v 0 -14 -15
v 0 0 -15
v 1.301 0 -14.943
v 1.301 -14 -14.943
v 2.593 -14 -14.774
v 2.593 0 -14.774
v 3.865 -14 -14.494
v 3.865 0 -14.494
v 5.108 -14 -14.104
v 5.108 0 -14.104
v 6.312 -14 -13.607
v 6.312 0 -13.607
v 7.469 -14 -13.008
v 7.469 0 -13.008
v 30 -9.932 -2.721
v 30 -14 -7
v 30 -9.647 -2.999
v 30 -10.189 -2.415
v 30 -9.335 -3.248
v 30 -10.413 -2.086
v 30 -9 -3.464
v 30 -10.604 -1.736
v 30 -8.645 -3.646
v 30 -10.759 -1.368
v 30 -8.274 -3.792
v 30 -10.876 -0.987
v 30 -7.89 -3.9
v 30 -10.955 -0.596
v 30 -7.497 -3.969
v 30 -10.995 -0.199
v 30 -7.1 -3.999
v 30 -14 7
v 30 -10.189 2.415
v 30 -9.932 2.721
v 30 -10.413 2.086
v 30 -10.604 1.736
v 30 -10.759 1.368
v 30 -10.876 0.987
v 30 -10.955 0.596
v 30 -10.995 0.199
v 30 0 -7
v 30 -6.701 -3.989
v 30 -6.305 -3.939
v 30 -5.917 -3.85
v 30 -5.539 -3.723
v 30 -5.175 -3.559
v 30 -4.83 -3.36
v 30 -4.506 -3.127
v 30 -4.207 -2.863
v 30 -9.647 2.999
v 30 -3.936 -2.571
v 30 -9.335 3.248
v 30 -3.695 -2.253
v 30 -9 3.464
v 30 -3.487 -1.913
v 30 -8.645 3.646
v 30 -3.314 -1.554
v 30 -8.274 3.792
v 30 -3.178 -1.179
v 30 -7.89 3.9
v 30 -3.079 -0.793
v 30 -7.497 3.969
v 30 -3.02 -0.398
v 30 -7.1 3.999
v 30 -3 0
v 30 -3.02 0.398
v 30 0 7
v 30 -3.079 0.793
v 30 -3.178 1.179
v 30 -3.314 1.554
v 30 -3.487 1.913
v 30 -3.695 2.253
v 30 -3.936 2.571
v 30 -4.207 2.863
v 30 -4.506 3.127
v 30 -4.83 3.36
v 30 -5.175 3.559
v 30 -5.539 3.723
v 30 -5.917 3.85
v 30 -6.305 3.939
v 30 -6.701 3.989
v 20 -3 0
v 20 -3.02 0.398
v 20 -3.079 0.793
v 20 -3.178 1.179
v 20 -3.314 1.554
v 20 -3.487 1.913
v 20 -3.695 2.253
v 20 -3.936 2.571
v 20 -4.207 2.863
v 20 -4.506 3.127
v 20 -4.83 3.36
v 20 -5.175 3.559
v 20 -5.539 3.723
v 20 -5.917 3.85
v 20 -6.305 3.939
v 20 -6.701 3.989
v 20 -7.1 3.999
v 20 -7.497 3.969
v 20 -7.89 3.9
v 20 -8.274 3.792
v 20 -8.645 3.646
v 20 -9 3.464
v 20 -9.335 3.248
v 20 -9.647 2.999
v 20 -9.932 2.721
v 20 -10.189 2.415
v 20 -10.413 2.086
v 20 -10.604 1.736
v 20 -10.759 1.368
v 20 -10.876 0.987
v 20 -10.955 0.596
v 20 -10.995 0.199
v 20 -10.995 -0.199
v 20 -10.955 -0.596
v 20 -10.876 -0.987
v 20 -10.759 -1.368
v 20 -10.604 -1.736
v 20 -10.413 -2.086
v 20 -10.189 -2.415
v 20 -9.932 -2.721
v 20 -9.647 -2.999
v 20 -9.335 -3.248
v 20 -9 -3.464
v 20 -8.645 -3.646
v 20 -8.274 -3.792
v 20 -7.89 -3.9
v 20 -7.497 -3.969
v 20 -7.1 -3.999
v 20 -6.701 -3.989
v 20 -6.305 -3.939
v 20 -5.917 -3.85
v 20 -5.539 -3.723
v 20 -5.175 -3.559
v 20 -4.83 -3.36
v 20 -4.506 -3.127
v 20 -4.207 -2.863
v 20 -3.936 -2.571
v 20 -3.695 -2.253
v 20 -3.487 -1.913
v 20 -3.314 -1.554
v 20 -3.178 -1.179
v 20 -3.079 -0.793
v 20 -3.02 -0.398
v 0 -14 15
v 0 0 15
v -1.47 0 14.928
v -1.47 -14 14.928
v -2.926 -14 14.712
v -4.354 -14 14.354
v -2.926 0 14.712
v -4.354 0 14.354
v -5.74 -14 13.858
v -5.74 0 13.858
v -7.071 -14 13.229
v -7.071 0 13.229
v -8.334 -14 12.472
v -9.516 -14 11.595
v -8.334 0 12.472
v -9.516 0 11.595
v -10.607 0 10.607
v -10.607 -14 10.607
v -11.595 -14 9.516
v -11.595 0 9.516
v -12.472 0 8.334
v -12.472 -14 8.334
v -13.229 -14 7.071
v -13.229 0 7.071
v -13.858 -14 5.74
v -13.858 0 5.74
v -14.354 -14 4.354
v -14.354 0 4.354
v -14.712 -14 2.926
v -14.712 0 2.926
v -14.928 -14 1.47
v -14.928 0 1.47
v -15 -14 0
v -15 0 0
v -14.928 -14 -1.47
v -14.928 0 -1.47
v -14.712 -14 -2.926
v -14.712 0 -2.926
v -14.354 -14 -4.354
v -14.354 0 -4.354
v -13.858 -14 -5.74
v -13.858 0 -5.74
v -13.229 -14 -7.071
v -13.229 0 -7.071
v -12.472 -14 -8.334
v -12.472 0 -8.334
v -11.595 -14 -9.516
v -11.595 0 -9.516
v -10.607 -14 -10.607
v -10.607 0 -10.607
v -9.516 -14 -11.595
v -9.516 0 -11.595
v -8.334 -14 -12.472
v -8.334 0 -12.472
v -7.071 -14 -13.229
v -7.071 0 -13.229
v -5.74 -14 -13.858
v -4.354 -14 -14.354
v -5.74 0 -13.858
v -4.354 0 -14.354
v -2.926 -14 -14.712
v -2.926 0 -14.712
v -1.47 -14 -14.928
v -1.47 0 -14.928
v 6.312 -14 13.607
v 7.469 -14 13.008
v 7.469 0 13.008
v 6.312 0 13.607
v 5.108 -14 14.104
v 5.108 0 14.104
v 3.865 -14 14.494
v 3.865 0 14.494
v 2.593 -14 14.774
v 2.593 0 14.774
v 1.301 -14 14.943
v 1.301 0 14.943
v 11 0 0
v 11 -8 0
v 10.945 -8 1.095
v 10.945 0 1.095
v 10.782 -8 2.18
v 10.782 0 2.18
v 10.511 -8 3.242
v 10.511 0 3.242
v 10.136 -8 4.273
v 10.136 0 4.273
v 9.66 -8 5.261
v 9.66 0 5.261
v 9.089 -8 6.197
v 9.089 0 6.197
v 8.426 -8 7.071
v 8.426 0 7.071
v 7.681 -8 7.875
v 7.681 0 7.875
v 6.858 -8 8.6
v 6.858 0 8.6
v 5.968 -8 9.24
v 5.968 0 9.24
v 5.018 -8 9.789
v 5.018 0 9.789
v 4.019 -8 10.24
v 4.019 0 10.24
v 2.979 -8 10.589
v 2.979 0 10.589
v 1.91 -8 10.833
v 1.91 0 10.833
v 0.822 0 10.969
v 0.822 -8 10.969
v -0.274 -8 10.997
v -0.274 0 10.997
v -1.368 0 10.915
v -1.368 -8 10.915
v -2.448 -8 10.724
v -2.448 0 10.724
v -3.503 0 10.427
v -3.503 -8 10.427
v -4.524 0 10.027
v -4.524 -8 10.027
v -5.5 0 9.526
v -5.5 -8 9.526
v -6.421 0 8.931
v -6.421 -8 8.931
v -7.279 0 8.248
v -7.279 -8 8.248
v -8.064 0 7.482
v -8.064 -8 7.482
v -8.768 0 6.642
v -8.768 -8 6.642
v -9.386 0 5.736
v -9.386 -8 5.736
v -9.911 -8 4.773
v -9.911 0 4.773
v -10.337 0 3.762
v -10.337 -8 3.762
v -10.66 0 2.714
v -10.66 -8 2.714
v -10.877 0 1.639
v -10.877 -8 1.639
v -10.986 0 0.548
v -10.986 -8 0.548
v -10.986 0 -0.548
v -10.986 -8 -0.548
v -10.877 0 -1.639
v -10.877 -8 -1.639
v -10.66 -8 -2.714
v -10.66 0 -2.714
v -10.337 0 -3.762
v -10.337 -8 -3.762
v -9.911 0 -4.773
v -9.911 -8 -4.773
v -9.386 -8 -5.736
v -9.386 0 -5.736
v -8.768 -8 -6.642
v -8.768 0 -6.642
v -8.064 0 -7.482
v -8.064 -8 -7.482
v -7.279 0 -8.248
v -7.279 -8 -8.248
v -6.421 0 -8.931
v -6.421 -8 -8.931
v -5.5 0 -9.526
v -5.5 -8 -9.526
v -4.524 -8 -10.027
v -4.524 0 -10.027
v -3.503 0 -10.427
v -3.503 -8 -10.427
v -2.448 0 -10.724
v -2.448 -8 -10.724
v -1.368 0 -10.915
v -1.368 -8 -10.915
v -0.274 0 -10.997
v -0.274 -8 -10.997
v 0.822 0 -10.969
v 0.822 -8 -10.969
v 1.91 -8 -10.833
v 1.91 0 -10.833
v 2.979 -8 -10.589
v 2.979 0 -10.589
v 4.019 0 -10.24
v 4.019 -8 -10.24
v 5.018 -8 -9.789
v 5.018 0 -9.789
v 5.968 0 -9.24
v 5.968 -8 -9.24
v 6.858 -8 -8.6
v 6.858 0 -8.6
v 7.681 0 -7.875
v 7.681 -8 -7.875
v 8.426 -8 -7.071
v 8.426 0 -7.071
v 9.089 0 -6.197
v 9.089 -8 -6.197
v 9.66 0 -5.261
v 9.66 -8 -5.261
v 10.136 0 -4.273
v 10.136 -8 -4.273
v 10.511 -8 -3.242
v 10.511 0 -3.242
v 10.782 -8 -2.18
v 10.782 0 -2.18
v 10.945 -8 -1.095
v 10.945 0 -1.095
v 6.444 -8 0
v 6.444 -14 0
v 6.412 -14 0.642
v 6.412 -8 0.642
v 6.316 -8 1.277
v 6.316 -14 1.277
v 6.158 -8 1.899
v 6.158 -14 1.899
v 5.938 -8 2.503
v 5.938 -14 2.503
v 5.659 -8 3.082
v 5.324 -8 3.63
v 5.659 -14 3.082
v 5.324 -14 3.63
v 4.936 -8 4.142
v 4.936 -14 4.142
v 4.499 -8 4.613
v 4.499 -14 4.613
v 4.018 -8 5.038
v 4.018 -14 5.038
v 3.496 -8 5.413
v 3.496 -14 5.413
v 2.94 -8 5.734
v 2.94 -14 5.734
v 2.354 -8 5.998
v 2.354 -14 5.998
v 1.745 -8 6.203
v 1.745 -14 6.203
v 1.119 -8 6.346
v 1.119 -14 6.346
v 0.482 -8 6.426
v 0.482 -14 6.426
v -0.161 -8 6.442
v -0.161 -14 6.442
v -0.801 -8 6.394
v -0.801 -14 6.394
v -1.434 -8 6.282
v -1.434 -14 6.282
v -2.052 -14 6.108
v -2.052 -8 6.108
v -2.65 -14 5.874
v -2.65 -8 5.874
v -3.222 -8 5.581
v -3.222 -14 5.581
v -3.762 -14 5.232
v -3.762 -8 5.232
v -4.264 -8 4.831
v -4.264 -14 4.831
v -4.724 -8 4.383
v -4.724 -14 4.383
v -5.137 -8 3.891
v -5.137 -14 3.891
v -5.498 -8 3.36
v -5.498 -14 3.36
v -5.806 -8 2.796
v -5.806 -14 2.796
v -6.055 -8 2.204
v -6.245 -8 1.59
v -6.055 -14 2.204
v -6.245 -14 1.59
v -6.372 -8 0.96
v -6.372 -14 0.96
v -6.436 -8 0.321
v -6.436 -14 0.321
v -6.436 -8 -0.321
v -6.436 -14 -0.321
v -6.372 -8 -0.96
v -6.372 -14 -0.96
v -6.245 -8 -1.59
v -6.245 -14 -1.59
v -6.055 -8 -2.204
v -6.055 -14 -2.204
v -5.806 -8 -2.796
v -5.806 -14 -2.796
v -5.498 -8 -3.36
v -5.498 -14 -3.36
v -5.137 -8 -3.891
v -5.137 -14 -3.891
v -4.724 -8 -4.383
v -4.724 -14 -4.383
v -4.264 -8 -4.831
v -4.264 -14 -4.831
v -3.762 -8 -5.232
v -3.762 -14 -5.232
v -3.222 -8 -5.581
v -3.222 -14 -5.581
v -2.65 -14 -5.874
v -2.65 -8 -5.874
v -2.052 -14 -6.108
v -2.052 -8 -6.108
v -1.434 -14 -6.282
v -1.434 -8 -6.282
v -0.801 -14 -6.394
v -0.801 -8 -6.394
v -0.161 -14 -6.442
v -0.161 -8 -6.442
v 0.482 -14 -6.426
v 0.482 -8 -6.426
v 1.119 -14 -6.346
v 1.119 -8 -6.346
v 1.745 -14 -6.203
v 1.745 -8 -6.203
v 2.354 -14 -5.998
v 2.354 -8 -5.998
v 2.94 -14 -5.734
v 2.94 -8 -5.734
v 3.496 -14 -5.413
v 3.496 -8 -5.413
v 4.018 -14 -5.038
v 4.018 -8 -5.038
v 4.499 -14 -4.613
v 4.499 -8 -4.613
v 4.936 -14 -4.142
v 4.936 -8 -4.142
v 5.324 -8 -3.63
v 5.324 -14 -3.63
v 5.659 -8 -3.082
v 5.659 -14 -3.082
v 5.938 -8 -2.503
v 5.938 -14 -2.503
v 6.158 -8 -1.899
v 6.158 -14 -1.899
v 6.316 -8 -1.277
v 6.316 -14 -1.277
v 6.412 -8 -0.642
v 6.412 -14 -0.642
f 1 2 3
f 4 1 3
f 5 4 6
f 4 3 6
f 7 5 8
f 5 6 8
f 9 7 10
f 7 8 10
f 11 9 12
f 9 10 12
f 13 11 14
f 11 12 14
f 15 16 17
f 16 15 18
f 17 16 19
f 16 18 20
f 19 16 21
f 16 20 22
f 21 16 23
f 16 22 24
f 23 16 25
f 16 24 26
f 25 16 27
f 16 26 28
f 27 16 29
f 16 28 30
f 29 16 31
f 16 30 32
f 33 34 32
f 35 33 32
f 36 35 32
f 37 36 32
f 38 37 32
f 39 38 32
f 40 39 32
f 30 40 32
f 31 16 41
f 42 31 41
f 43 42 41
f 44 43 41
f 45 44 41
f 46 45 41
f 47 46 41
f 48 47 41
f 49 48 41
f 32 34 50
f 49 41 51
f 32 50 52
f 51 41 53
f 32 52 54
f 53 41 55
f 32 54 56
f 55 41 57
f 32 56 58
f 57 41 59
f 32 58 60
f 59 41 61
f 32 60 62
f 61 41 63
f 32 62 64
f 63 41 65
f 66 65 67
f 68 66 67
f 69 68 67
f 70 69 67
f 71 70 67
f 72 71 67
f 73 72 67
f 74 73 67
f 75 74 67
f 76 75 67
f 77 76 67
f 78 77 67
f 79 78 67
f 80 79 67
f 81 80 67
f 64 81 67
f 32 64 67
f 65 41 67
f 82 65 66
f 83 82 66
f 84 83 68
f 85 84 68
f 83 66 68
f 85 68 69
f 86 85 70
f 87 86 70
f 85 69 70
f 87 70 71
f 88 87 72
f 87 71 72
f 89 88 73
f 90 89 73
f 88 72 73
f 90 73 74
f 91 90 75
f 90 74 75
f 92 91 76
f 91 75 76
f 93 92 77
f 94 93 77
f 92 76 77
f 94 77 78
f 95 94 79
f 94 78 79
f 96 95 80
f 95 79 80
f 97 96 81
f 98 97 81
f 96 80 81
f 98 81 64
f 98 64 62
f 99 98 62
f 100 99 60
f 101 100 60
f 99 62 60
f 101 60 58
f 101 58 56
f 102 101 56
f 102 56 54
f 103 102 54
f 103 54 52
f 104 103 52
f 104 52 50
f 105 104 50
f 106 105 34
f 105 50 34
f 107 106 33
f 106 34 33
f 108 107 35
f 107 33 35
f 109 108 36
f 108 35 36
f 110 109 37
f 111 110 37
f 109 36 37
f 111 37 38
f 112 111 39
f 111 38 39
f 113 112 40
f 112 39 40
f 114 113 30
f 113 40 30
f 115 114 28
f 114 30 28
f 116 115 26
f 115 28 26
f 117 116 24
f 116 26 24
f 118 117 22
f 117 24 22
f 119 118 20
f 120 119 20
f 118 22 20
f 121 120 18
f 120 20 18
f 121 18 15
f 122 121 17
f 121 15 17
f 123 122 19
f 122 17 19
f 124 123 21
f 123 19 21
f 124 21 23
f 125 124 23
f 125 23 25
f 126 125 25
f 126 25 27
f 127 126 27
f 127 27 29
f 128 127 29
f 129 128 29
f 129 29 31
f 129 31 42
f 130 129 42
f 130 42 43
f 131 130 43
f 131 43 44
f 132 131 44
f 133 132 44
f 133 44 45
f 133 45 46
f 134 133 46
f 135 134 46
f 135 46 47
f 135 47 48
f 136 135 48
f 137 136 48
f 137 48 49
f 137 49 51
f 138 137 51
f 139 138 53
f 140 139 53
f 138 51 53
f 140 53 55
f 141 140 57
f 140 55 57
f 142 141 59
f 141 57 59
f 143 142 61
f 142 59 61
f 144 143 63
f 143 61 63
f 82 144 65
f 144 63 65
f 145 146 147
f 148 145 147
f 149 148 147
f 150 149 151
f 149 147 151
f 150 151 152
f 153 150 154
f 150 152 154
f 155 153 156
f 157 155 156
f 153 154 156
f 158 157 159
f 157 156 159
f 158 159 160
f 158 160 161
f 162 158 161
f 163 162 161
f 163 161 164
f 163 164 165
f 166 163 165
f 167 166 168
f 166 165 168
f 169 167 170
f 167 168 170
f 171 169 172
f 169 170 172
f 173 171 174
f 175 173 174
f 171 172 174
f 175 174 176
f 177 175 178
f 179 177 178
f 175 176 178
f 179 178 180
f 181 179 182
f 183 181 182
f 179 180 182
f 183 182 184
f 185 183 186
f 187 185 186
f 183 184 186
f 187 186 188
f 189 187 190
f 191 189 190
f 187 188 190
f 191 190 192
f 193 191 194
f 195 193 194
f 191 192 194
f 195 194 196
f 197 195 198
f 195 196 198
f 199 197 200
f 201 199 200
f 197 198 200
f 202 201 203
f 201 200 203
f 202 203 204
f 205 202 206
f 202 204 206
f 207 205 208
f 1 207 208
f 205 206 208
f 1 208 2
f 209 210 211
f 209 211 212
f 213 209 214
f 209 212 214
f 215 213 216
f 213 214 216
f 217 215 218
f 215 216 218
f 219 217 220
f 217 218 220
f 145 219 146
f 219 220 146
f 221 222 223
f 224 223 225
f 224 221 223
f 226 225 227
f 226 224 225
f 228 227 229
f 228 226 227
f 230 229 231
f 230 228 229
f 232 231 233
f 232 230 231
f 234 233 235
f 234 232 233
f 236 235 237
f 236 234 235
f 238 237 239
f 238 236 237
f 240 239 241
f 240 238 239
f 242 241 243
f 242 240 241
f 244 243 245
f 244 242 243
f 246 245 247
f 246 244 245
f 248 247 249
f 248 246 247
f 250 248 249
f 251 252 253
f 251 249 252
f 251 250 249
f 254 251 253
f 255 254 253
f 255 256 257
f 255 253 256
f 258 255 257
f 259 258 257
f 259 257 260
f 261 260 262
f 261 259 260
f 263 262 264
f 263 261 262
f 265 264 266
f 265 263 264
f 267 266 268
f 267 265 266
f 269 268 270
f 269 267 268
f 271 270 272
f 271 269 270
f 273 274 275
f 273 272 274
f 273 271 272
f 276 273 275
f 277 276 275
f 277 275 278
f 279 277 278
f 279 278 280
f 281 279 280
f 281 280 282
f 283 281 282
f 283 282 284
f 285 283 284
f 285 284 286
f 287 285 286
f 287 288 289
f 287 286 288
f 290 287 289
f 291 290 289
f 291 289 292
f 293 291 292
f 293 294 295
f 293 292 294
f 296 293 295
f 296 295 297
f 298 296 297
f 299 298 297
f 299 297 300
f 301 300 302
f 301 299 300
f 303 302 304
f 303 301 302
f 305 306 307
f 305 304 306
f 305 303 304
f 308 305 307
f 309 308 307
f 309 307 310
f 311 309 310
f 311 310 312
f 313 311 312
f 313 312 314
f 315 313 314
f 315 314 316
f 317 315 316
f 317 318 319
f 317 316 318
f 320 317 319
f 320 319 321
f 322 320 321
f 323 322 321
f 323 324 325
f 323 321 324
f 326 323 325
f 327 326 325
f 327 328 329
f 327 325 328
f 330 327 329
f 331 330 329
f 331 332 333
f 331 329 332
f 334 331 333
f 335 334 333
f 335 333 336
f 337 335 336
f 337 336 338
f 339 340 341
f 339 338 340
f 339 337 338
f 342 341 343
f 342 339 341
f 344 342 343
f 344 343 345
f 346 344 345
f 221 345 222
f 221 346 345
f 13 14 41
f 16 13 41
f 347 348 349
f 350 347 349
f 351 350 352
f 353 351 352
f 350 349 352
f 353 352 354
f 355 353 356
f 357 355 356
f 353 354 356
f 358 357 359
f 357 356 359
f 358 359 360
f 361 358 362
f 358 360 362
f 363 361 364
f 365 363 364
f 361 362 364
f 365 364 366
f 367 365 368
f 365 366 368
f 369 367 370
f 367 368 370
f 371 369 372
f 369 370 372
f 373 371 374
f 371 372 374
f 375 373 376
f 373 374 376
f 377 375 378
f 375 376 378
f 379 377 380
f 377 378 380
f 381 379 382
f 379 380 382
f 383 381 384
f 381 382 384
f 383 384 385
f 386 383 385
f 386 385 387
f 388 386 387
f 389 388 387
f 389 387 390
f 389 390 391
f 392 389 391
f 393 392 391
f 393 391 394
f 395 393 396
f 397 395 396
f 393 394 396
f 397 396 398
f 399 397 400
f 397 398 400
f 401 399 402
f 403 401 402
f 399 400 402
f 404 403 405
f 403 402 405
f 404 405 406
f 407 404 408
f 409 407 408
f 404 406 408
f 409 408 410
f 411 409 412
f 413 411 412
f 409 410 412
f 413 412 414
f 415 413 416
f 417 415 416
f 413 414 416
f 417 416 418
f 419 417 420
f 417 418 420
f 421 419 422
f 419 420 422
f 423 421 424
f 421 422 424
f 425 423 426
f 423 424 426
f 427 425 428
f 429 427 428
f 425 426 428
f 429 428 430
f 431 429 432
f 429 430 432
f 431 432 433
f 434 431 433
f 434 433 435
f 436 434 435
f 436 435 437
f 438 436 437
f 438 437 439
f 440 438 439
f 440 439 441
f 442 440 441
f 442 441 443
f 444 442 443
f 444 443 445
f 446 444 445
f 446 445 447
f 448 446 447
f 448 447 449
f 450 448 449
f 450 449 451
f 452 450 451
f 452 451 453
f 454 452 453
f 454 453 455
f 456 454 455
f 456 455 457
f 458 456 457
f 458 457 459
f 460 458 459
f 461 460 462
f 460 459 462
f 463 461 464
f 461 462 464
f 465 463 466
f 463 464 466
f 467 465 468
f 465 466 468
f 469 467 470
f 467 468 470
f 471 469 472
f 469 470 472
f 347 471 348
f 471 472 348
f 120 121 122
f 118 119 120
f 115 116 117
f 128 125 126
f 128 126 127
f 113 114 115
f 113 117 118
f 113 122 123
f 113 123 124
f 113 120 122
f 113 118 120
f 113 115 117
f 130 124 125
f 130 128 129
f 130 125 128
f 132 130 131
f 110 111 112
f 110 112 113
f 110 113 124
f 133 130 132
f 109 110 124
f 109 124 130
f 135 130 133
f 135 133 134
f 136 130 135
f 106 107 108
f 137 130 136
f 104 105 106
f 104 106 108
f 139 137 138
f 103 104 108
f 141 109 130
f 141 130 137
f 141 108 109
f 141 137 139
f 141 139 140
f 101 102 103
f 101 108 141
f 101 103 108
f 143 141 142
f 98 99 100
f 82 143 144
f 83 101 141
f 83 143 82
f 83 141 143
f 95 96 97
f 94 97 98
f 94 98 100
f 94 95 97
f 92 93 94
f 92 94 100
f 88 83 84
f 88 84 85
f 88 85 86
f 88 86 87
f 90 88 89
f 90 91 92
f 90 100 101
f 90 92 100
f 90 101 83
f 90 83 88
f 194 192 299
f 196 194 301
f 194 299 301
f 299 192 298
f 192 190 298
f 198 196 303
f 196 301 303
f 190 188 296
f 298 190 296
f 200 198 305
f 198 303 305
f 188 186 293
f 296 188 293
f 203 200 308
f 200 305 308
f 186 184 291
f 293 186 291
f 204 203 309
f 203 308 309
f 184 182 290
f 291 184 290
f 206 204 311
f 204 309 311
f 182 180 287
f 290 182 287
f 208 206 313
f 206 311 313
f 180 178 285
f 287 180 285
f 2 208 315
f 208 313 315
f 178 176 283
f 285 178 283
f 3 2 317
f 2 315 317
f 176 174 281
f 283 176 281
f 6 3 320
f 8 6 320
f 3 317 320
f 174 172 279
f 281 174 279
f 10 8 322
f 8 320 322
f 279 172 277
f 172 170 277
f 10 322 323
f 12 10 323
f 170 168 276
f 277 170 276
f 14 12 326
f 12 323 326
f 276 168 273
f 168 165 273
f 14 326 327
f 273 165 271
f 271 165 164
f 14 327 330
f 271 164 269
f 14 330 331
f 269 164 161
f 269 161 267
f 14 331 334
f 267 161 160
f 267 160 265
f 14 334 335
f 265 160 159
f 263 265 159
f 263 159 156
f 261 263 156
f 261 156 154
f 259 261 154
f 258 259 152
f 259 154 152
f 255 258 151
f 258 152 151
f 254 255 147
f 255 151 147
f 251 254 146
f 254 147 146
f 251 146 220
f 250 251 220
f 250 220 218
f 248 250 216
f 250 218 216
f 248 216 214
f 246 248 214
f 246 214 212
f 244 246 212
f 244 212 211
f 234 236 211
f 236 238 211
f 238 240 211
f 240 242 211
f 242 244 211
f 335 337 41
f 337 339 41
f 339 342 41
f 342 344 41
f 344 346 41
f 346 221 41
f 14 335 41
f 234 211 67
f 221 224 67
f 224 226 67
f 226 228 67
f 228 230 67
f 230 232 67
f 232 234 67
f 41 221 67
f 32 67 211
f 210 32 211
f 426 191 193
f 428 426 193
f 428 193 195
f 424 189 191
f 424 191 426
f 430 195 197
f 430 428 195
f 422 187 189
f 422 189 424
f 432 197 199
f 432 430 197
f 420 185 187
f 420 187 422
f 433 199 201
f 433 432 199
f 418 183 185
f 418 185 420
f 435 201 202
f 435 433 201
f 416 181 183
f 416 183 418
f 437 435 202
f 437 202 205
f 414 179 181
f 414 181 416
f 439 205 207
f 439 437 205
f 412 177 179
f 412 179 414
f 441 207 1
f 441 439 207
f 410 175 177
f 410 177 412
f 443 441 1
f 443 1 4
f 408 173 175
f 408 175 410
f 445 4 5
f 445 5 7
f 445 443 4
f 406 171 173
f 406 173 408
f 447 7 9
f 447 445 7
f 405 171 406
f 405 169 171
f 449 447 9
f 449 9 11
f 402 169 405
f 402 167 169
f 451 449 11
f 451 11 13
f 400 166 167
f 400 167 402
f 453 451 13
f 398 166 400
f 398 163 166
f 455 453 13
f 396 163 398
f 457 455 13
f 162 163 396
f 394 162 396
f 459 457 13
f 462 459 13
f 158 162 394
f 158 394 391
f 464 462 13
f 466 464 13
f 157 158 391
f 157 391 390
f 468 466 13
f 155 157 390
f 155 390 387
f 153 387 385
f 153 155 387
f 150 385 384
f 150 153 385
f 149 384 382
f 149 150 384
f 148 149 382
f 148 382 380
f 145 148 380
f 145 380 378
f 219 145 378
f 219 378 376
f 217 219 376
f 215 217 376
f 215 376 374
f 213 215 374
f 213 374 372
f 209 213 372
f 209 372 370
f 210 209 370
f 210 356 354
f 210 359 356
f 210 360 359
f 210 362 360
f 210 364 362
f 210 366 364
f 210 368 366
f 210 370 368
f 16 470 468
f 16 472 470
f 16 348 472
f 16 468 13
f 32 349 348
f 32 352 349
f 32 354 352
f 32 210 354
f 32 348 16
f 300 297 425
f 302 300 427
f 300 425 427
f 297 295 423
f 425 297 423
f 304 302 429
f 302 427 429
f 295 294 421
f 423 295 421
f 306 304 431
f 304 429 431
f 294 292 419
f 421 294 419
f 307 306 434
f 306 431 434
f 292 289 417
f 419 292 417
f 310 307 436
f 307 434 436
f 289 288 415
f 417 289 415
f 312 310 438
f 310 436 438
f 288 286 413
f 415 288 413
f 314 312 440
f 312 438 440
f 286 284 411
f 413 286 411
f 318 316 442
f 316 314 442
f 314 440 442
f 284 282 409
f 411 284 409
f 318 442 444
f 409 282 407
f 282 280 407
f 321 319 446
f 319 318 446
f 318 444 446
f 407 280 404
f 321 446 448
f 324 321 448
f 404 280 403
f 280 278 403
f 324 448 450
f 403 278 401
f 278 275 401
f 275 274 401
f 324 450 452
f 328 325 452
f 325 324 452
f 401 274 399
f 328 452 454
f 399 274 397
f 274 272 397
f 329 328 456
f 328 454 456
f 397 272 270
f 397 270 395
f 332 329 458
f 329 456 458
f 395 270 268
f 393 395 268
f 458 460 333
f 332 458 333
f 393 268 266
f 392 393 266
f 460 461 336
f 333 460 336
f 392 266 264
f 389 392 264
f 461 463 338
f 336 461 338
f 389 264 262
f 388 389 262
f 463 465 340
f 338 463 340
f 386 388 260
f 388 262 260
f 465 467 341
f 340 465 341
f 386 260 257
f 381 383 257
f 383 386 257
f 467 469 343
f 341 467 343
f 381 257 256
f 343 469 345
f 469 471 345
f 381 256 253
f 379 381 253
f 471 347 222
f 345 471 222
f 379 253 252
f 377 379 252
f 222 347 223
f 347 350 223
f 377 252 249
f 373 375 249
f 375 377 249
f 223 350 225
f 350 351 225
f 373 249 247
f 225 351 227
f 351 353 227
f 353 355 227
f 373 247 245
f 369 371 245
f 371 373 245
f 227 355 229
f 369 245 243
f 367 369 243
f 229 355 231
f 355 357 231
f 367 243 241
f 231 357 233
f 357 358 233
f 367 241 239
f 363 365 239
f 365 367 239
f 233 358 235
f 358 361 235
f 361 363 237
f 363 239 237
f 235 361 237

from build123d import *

# Parameters (mm, degrees)
F0_R     = 11
F1_DEPTH = 14
F2_R     = 4
F3_DEPTH = 10
F4_R     = 11.274744
F4_R_2   = 6.443865
F5_DEPTH = 6


with BuildPart() as f1:
    # F0 (on Front) → F1 (new body)
    with BuildSketch(Plane.XZ):
        with BuildLine():
            Line((7.46888, 13.008299), (0, 15))
            ThreePointArc((0, 15), (-15, 0), (0, -15))
            Line((0, -15), (7.46888, -13.008299))
            ThreePointArc((7.46888, -13.008299), (12.981394, -7.515544), (15, 0))
            ThreePointArc((15, 0), (12.981394, 7.515544), (7.46888, 13.008299))
        make_face()
        Circle(F0_R, mode=Mode.SUBTRACT)
        with BuildLine():
            ThreePointArc((7.46888, 13.008299), (3.86494, 14.493524), (0, 15))
            Line((0, 15), (7.46888, 13.008299))
        make_face()
        with BuildLine():
            Line((7.46888, -13.008299), (0, -15))
            ThreePointArc((0, -15), (3.86494, -14.493524), (7.46888, -13.008299))
        make_face()
        with BuildLine():
            Line((30, 7), (7.46888, 13.008299))
            ThreePointArc((7.46888, 13.008299), (12.981394, 7.515544), (15, 0))
            ThreePointArc((15, 0), (12.981394, -7.515544), (7.46888, -13.008299))
            Line((7.46888, -13.008299), (30, -7))
            Line((30, -7), (30, 0))
            Line((30, 0), (30, 7))
        make_face()
    extrude(amount=F1_DEPTH)

    # F2 (on face) → F3 (cut)
    with BuildSketch(Plane.YZ.offset(30)):
        with Locations((-7, 0)):
            Circle(F2_R)
    extrude(amount=-F3_DEPTH, mode=Mode.SUBTRACT)

    # F4 (on face) → F5 (join)
    with BuildSketch(Plane.XZ.offset(14)):
        Circle(F4_R)
        Circle(F4_R_2, mode=Mode.SUBTRACT)
    extrude(amount=-F5_DEPTH)


solid = f1.part
